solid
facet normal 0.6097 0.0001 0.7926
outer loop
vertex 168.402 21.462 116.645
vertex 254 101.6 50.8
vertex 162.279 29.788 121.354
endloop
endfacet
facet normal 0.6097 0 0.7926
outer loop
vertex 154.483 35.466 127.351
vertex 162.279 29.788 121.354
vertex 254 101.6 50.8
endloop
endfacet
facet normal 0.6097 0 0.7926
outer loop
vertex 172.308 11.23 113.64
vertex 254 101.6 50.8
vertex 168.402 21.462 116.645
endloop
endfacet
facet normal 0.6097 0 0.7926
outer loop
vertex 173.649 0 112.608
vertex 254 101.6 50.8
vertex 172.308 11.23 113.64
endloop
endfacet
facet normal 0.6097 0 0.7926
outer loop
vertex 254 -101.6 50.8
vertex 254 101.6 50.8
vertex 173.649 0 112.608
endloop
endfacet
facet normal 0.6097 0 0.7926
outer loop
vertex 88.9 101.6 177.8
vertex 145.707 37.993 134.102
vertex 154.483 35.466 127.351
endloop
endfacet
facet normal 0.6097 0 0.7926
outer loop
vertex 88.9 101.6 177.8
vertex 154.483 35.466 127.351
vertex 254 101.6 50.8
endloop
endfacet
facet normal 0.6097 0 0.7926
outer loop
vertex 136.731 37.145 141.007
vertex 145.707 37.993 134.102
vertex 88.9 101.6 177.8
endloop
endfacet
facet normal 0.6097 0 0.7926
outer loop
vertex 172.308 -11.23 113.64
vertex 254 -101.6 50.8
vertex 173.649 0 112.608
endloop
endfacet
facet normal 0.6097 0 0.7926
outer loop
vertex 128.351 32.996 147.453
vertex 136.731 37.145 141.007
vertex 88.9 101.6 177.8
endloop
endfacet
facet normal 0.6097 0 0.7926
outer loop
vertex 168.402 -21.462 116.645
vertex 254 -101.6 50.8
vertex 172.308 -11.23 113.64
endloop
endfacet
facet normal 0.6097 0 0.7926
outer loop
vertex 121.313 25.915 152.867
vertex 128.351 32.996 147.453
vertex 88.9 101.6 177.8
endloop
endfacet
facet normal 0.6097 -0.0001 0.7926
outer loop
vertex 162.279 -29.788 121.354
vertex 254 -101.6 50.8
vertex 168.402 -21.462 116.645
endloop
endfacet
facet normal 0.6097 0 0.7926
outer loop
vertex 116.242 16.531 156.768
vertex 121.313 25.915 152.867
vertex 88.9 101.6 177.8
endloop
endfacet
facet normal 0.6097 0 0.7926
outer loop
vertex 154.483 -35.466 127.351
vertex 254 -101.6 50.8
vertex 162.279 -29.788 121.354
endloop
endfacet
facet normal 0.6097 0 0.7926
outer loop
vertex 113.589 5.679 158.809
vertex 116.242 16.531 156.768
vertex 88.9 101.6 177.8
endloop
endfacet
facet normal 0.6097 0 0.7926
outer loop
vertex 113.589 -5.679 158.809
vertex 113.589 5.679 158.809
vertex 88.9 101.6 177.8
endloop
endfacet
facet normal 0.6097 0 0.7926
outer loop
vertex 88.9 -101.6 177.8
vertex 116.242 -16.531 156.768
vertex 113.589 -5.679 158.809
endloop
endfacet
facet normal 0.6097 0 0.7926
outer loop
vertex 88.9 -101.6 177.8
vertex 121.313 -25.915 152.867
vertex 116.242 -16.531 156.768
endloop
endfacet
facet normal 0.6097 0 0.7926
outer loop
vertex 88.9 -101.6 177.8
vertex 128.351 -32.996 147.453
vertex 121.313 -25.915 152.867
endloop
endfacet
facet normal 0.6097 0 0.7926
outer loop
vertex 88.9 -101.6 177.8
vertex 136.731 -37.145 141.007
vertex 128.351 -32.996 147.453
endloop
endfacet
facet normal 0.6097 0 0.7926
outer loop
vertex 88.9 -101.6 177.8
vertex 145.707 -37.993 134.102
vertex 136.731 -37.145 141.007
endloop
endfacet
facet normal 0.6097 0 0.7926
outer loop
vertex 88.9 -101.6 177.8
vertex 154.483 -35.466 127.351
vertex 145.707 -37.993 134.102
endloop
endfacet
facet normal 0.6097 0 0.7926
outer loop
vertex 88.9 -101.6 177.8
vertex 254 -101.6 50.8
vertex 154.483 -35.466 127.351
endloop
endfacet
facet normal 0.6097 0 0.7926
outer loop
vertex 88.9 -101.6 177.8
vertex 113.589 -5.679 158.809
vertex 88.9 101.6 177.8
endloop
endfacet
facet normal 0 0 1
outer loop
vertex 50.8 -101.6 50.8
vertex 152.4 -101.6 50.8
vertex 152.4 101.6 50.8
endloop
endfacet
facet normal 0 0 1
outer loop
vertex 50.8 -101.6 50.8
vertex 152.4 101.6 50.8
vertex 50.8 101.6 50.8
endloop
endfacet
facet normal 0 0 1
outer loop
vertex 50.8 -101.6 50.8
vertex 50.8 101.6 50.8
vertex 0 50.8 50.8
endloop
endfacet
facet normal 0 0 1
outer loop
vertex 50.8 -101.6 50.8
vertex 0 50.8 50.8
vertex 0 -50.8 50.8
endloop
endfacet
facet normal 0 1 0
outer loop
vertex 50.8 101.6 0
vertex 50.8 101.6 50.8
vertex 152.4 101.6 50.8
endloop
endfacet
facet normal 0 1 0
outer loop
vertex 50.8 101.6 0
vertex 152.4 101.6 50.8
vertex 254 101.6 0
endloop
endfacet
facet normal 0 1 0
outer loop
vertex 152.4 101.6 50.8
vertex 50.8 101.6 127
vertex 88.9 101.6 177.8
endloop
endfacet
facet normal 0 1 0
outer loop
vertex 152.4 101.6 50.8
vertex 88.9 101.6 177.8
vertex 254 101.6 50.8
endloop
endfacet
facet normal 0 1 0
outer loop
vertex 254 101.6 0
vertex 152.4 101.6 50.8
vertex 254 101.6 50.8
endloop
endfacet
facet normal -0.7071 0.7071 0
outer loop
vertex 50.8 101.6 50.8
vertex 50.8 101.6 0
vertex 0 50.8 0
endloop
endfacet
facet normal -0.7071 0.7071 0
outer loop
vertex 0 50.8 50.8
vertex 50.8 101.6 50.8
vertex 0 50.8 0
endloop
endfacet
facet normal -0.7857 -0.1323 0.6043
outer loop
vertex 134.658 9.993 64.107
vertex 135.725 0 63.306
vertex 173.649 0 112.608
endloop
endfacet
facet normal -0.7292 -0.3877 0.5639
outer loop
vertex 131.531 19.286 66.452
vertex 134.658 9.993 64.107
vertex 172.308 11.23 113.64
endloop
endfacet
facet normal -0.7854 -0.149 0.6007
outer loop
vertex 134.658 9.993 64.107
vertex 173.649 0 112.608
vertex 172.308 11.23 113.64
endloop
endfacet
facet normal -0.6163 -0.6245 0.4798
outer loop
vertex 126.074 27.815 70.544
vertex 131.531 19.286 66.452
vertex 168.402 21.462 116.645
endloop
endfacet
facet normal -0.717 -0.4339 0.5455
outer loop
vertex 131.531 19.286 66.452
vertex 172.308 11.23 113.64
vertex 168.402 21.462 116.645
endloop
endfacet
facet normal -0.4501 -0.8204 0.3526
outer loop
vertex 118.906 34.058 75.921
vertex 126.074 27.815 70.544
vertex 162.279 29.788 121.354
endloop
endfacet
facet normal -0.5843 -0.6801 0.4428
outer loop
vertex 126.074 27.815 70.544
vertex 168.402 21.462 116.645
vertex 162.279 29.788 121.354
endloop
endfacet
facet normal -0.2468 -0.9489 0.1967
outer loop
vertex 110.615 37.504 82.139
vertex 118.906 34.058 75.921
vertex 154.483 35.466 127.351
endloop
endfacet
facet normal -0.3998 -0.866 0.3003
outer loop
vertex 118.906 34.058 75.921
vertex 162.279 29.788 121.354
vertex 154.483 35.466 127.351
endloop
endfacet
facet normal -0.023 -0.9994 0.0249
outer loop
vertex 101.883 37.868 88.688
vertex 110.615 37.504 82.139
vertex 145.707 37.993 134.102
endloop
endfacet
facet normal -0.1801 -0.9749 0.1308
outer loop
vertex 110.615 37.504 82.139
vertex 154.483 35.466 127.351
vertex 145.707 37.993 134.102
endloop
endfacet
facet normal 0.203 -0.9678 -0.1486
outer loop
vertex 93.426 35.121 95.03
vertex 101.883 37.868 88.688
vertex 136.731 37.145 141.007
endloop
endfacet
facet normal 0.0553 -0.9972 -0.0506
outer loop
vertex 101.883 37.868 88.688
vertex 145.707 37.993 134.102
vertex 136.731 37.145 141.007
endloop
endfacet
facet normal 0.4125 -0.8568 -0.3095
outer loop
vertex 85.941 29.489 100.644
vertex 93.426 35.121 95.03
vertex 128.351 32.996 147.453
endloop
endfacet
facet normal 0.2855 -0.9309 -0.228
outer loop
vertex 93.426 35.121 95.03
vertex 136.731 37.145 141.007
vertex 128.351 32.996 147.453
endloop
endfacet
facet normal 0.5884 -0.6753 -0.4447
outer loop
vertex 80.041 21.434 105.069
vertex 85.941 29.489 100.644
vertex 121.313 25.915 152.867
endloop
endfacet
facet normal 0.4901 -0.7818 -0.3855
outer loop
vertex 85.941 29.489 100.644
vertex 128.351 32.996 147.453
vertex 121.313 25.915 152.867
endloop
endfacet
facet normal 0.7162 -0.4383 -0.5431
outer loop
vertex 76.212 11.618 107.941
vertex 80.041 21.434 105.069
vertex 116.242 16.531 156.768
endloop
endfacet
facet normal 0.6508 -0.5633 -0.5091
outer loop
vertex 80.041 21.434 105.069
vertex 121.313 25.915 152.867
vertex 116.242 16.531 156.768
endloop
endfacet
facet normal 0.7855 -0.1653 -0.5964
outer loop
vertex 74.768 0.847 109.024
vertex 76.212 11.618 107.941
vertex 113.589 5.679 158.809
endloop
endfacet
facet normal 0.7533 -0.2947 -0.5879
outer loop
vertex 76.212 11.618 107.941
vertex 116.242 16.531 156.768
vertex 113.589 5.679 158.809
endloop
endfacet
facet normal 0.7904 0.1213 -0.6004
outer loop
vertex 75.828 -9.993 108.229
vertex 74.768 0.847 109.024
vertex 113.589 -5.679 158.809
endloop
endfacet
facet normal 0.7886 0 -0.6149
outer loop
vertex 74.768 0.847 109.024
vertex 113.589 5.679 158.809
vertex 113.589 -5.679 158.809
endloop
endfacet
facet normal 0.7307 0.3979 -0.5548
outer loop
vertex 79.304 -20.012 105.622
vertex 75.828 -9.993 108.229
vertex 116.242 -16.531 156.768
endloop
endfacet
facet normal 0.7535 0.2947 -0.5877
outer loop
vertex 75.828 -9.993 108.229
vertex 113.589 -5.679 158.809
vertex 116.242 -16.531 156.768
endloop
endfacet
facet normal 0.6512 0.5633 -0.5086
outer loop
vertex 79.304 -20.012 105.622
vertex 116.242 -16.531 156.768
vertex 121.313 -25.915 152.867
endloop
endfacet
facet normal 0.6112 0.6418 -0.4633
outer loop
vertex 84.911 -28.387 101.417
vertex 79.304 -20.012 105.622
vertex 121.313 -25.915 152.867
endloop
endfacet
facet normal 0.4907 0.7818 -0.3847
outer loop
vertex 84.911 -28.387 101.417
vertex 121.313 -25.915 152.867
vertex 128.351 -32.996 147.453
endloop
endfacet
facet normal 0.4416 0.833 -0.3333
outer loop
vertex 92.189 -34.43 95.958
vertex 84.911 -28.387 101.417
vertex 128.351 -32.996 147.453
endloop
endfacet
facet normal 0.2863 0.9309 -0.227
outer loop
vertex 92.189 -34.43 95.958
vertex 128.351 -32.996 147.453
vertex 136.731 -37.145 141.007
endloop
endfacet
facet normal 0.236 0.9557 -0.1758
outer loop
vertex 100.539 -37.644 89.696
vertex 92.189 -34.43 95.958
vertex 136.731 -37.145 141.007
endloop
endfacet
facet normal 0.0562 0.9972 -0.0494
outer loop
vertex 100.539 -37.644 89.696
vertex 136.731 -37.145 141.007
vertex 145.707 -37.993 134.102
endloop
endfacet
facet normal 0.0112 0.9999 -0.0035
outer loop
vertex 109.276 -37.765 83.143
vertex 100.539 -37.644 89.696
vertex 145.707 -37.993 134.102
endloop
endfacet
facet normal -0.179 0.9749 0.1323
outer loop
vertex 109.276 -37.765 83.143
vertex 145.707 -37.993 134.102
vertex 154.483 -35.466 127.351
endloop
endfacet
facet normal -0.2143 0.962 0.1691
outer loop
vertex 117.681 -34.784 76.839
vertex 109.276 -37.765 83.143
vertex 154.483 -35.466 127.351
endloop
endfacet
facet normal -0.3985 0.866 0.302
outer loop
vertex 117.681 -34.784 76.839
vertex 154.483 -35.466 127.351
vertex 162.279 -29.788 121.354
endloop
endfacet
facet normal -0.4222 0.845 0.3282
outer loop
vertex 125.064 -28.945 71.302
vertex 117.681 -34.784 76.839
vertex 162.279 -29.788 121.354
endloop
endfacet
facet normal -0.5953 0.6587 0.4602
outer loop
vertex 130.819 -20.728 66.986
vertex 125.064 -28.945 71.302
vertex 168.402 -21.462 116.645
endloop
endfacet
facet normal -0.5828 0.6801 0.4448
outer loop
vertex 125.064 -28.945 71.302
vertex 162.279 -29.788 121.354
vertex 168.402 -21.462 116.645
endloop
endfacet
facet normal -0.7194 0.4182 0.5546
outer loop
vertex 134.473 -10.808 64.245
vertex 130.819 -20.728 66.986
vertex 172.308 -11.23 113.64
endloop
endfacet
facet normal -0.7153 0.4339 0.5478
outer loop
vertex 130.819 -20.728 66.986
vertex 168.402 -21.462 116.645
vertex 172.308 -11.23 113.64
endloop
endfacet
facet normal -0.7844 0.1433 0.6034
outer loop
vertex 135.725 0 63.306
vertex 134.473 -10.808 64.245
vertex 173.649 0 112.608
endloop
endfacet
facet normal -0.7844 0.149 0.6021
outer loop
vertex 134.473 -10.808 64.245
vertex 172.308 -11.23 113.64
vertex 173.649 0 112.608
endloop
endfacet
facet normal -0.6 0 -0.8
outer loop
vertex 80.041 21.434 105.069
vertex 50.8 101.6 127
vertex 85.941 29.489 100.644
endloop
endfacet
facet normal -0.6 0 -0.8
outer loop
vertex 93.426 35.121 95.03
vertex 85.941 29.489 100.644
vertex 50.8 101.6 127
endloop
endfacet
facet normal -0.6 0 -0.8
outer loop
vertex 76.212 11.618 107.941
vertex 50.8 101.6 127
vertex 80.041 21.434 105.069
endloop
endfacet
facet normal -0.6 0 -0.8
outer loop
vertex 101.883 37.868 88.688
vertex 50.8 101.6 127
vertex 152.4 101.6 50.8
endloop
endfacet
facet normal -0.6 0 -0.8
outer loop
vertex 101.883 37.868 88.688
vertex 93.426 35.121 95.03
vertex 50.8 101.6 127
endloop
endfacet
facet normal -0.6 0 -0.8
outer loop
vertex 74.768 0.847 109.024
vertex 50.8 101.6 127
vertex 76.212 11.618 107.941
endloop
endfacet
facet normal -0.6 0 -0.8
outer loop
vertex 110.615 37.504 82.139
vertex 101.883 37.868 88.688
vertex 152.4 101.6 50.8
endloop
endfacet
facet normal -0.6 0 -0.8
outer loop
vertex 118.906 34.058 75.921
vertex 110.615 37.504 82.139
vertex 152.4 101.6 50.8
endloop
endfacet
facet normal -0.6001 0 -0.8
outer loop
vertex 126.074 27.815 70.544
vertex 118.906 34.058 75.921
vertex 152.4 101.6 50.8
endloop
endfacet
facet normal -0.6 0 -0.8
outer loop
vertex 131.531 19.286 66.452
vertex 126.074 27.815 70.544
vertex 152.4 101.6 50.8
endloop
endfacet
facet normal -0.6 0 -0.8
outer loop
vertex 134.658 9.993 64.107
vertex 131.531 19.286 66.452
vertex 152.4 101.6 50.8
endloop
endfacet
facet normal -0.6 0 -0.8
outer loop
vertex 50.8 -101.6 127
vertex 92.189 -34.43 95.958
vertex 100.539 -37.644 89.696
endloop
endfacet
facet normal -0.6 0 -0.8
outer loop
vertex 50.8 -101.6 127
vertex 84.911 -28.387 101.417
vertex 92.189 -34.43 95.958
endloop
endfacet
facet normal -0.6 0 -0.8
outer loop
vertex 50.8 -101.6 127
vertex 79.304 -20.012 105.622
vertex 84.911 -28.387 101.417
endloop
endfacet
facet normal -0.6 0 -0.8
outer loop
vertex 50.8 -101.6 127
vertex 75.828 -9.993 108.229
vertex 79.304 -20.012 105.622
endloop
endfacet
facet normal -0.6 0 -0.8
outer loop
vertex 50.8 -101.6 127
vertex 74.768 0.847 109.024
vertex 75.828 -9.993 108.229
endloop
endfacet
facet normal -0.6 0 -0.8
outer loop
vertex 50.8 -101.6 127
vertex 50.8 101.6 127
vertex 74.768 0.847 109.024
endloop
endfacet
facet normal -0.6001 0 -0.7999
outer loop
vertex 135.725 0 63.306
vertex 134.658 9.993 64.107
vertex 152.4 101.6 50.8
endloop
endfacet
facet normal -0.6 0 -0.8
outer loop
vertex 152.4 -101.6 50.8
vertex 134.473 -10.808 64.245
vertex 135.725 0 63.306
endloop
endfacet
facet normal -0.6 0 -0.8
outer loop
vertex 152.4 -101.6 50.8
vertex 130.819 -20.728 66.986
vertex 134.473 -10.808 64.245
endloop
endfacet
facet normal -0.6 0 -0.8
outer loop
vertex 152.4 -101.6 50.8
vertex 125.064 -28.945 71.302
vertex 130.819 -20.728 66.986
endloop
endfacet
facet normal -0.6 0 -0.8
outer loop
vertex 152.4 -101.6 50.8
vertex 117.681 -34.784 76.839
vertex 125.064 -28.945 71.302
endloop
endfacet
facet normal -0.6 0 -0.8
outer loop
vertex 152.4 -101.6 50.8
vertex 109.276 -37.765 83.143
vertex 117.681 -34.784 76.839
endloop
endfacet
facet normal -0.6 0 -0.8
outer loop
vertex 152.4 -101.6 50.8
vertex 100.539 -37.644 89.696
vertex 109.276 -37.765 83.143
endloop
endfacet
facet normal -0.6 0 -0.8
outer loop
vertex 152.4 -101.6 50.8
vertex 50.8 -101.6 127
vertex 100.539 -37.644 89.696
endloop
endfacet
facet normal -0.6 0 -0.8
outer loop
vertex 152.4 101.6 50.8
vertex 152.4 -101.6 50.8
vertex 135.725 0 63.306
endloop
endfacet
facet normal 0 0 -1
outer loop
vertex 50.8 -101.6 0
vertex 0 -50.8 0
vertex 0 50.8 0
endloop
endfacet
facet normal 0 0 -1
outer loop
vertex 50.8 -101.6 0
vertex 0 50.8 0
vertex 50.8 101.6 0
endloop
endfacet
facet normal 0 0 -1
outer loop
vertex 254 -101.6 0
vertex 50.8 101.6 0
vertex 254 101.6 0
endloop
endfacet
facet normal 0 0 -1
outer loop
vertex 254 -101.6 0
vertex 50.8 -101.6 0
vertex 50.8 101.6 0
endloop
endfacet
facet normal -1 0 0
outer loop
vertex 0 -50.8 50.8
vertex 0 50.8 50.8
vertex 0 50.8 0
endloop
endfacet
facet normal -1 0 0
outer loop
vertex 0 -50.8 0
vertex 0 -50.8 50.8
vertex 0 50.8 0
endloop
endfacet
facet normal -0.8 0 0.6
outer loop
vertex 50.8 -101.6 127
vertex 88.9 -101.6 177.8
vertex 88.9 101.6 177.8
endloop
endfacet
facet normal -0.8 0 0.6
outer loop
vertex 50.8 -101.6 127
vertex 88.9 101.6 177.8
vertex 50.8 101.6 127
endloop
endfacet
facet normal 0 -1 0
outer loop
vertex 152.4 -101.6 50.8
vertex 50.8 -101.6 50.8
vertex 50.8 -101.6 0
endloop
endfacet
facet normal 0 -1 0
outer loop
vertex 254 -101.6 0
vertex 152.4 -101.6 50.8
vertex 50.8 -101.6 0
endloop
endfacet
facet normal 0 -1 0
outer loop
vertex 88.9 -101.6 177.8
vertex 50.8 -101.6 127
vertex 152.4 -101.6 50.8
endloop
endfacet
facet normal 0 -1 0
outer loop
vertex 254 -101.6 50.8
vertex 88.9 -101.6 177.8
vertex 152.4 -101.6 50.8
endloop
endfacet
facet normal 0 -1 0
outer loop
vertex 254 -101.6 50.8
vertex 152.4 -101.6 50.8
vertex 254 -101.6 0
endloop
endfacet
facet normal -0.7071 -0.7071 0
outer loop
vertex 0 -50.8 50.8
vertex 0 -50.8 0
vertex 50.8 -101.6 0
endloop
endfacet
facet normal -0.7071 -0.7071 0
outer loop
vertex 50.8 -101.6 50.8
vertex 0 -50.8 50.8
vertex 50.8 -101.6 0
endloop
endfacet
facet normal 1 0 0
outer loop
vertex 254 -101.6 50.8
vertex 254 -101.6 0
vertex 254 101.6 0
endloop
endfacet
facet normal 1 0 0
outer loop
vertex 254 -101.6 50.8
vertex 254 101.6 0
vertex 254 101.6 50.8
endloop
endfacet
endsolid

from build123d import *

# Parameters (mm, degrees)
F1_DEPTH = 101.6
F2_R     = 38.1
F3_DEPTH = 74.422
F5_DEPTH = 72.136


with BuildPart() as f1:
    # F0 (on Front) → F1 (new body, symmetric)
    with BuildSketch(Plane.XZ):
        Polygon((0, 50.8), (0, 0), (254, 0), (254, 50.8), (88.9, 177.8), (50.8, 127), (152.4, 50.8), (76.2, 50.8), align=None)
    extrude(amount=F1_DEPTH, both=True)

    # F2 (on face) → F3 (cut)
    with BuildSketch(Plane(origin=(118.9739776952, 0, 154.6661710037), x_dir=(0.7926239891, 0, -0.6097107608), z_dir=(0.6097107608, 0, 0.7926239891))):
        with Locations((30.880294776, 0)):
            Circle(F2_R)
    extrude(amount=-F3_DEPTH, mode=Mode.SUBTRACT)

    # F4 (on face) → F5 (cut)
    with BuildSketch(Plane(origin=(0, 0, 0), x_dir=(1, 0, 0), z_dir=(0, 0, -1))):
        Polygon((0, -50.8), (0, -101.6), (50.8, -101.6), align=None)
        Polygon((0, 101.6), (0, 50.8), (50.8, 101.6), align=None)
    extrude(amount=-F5_DEPTH, mode=Mode.SUBTRACT)


solid = f1.part
